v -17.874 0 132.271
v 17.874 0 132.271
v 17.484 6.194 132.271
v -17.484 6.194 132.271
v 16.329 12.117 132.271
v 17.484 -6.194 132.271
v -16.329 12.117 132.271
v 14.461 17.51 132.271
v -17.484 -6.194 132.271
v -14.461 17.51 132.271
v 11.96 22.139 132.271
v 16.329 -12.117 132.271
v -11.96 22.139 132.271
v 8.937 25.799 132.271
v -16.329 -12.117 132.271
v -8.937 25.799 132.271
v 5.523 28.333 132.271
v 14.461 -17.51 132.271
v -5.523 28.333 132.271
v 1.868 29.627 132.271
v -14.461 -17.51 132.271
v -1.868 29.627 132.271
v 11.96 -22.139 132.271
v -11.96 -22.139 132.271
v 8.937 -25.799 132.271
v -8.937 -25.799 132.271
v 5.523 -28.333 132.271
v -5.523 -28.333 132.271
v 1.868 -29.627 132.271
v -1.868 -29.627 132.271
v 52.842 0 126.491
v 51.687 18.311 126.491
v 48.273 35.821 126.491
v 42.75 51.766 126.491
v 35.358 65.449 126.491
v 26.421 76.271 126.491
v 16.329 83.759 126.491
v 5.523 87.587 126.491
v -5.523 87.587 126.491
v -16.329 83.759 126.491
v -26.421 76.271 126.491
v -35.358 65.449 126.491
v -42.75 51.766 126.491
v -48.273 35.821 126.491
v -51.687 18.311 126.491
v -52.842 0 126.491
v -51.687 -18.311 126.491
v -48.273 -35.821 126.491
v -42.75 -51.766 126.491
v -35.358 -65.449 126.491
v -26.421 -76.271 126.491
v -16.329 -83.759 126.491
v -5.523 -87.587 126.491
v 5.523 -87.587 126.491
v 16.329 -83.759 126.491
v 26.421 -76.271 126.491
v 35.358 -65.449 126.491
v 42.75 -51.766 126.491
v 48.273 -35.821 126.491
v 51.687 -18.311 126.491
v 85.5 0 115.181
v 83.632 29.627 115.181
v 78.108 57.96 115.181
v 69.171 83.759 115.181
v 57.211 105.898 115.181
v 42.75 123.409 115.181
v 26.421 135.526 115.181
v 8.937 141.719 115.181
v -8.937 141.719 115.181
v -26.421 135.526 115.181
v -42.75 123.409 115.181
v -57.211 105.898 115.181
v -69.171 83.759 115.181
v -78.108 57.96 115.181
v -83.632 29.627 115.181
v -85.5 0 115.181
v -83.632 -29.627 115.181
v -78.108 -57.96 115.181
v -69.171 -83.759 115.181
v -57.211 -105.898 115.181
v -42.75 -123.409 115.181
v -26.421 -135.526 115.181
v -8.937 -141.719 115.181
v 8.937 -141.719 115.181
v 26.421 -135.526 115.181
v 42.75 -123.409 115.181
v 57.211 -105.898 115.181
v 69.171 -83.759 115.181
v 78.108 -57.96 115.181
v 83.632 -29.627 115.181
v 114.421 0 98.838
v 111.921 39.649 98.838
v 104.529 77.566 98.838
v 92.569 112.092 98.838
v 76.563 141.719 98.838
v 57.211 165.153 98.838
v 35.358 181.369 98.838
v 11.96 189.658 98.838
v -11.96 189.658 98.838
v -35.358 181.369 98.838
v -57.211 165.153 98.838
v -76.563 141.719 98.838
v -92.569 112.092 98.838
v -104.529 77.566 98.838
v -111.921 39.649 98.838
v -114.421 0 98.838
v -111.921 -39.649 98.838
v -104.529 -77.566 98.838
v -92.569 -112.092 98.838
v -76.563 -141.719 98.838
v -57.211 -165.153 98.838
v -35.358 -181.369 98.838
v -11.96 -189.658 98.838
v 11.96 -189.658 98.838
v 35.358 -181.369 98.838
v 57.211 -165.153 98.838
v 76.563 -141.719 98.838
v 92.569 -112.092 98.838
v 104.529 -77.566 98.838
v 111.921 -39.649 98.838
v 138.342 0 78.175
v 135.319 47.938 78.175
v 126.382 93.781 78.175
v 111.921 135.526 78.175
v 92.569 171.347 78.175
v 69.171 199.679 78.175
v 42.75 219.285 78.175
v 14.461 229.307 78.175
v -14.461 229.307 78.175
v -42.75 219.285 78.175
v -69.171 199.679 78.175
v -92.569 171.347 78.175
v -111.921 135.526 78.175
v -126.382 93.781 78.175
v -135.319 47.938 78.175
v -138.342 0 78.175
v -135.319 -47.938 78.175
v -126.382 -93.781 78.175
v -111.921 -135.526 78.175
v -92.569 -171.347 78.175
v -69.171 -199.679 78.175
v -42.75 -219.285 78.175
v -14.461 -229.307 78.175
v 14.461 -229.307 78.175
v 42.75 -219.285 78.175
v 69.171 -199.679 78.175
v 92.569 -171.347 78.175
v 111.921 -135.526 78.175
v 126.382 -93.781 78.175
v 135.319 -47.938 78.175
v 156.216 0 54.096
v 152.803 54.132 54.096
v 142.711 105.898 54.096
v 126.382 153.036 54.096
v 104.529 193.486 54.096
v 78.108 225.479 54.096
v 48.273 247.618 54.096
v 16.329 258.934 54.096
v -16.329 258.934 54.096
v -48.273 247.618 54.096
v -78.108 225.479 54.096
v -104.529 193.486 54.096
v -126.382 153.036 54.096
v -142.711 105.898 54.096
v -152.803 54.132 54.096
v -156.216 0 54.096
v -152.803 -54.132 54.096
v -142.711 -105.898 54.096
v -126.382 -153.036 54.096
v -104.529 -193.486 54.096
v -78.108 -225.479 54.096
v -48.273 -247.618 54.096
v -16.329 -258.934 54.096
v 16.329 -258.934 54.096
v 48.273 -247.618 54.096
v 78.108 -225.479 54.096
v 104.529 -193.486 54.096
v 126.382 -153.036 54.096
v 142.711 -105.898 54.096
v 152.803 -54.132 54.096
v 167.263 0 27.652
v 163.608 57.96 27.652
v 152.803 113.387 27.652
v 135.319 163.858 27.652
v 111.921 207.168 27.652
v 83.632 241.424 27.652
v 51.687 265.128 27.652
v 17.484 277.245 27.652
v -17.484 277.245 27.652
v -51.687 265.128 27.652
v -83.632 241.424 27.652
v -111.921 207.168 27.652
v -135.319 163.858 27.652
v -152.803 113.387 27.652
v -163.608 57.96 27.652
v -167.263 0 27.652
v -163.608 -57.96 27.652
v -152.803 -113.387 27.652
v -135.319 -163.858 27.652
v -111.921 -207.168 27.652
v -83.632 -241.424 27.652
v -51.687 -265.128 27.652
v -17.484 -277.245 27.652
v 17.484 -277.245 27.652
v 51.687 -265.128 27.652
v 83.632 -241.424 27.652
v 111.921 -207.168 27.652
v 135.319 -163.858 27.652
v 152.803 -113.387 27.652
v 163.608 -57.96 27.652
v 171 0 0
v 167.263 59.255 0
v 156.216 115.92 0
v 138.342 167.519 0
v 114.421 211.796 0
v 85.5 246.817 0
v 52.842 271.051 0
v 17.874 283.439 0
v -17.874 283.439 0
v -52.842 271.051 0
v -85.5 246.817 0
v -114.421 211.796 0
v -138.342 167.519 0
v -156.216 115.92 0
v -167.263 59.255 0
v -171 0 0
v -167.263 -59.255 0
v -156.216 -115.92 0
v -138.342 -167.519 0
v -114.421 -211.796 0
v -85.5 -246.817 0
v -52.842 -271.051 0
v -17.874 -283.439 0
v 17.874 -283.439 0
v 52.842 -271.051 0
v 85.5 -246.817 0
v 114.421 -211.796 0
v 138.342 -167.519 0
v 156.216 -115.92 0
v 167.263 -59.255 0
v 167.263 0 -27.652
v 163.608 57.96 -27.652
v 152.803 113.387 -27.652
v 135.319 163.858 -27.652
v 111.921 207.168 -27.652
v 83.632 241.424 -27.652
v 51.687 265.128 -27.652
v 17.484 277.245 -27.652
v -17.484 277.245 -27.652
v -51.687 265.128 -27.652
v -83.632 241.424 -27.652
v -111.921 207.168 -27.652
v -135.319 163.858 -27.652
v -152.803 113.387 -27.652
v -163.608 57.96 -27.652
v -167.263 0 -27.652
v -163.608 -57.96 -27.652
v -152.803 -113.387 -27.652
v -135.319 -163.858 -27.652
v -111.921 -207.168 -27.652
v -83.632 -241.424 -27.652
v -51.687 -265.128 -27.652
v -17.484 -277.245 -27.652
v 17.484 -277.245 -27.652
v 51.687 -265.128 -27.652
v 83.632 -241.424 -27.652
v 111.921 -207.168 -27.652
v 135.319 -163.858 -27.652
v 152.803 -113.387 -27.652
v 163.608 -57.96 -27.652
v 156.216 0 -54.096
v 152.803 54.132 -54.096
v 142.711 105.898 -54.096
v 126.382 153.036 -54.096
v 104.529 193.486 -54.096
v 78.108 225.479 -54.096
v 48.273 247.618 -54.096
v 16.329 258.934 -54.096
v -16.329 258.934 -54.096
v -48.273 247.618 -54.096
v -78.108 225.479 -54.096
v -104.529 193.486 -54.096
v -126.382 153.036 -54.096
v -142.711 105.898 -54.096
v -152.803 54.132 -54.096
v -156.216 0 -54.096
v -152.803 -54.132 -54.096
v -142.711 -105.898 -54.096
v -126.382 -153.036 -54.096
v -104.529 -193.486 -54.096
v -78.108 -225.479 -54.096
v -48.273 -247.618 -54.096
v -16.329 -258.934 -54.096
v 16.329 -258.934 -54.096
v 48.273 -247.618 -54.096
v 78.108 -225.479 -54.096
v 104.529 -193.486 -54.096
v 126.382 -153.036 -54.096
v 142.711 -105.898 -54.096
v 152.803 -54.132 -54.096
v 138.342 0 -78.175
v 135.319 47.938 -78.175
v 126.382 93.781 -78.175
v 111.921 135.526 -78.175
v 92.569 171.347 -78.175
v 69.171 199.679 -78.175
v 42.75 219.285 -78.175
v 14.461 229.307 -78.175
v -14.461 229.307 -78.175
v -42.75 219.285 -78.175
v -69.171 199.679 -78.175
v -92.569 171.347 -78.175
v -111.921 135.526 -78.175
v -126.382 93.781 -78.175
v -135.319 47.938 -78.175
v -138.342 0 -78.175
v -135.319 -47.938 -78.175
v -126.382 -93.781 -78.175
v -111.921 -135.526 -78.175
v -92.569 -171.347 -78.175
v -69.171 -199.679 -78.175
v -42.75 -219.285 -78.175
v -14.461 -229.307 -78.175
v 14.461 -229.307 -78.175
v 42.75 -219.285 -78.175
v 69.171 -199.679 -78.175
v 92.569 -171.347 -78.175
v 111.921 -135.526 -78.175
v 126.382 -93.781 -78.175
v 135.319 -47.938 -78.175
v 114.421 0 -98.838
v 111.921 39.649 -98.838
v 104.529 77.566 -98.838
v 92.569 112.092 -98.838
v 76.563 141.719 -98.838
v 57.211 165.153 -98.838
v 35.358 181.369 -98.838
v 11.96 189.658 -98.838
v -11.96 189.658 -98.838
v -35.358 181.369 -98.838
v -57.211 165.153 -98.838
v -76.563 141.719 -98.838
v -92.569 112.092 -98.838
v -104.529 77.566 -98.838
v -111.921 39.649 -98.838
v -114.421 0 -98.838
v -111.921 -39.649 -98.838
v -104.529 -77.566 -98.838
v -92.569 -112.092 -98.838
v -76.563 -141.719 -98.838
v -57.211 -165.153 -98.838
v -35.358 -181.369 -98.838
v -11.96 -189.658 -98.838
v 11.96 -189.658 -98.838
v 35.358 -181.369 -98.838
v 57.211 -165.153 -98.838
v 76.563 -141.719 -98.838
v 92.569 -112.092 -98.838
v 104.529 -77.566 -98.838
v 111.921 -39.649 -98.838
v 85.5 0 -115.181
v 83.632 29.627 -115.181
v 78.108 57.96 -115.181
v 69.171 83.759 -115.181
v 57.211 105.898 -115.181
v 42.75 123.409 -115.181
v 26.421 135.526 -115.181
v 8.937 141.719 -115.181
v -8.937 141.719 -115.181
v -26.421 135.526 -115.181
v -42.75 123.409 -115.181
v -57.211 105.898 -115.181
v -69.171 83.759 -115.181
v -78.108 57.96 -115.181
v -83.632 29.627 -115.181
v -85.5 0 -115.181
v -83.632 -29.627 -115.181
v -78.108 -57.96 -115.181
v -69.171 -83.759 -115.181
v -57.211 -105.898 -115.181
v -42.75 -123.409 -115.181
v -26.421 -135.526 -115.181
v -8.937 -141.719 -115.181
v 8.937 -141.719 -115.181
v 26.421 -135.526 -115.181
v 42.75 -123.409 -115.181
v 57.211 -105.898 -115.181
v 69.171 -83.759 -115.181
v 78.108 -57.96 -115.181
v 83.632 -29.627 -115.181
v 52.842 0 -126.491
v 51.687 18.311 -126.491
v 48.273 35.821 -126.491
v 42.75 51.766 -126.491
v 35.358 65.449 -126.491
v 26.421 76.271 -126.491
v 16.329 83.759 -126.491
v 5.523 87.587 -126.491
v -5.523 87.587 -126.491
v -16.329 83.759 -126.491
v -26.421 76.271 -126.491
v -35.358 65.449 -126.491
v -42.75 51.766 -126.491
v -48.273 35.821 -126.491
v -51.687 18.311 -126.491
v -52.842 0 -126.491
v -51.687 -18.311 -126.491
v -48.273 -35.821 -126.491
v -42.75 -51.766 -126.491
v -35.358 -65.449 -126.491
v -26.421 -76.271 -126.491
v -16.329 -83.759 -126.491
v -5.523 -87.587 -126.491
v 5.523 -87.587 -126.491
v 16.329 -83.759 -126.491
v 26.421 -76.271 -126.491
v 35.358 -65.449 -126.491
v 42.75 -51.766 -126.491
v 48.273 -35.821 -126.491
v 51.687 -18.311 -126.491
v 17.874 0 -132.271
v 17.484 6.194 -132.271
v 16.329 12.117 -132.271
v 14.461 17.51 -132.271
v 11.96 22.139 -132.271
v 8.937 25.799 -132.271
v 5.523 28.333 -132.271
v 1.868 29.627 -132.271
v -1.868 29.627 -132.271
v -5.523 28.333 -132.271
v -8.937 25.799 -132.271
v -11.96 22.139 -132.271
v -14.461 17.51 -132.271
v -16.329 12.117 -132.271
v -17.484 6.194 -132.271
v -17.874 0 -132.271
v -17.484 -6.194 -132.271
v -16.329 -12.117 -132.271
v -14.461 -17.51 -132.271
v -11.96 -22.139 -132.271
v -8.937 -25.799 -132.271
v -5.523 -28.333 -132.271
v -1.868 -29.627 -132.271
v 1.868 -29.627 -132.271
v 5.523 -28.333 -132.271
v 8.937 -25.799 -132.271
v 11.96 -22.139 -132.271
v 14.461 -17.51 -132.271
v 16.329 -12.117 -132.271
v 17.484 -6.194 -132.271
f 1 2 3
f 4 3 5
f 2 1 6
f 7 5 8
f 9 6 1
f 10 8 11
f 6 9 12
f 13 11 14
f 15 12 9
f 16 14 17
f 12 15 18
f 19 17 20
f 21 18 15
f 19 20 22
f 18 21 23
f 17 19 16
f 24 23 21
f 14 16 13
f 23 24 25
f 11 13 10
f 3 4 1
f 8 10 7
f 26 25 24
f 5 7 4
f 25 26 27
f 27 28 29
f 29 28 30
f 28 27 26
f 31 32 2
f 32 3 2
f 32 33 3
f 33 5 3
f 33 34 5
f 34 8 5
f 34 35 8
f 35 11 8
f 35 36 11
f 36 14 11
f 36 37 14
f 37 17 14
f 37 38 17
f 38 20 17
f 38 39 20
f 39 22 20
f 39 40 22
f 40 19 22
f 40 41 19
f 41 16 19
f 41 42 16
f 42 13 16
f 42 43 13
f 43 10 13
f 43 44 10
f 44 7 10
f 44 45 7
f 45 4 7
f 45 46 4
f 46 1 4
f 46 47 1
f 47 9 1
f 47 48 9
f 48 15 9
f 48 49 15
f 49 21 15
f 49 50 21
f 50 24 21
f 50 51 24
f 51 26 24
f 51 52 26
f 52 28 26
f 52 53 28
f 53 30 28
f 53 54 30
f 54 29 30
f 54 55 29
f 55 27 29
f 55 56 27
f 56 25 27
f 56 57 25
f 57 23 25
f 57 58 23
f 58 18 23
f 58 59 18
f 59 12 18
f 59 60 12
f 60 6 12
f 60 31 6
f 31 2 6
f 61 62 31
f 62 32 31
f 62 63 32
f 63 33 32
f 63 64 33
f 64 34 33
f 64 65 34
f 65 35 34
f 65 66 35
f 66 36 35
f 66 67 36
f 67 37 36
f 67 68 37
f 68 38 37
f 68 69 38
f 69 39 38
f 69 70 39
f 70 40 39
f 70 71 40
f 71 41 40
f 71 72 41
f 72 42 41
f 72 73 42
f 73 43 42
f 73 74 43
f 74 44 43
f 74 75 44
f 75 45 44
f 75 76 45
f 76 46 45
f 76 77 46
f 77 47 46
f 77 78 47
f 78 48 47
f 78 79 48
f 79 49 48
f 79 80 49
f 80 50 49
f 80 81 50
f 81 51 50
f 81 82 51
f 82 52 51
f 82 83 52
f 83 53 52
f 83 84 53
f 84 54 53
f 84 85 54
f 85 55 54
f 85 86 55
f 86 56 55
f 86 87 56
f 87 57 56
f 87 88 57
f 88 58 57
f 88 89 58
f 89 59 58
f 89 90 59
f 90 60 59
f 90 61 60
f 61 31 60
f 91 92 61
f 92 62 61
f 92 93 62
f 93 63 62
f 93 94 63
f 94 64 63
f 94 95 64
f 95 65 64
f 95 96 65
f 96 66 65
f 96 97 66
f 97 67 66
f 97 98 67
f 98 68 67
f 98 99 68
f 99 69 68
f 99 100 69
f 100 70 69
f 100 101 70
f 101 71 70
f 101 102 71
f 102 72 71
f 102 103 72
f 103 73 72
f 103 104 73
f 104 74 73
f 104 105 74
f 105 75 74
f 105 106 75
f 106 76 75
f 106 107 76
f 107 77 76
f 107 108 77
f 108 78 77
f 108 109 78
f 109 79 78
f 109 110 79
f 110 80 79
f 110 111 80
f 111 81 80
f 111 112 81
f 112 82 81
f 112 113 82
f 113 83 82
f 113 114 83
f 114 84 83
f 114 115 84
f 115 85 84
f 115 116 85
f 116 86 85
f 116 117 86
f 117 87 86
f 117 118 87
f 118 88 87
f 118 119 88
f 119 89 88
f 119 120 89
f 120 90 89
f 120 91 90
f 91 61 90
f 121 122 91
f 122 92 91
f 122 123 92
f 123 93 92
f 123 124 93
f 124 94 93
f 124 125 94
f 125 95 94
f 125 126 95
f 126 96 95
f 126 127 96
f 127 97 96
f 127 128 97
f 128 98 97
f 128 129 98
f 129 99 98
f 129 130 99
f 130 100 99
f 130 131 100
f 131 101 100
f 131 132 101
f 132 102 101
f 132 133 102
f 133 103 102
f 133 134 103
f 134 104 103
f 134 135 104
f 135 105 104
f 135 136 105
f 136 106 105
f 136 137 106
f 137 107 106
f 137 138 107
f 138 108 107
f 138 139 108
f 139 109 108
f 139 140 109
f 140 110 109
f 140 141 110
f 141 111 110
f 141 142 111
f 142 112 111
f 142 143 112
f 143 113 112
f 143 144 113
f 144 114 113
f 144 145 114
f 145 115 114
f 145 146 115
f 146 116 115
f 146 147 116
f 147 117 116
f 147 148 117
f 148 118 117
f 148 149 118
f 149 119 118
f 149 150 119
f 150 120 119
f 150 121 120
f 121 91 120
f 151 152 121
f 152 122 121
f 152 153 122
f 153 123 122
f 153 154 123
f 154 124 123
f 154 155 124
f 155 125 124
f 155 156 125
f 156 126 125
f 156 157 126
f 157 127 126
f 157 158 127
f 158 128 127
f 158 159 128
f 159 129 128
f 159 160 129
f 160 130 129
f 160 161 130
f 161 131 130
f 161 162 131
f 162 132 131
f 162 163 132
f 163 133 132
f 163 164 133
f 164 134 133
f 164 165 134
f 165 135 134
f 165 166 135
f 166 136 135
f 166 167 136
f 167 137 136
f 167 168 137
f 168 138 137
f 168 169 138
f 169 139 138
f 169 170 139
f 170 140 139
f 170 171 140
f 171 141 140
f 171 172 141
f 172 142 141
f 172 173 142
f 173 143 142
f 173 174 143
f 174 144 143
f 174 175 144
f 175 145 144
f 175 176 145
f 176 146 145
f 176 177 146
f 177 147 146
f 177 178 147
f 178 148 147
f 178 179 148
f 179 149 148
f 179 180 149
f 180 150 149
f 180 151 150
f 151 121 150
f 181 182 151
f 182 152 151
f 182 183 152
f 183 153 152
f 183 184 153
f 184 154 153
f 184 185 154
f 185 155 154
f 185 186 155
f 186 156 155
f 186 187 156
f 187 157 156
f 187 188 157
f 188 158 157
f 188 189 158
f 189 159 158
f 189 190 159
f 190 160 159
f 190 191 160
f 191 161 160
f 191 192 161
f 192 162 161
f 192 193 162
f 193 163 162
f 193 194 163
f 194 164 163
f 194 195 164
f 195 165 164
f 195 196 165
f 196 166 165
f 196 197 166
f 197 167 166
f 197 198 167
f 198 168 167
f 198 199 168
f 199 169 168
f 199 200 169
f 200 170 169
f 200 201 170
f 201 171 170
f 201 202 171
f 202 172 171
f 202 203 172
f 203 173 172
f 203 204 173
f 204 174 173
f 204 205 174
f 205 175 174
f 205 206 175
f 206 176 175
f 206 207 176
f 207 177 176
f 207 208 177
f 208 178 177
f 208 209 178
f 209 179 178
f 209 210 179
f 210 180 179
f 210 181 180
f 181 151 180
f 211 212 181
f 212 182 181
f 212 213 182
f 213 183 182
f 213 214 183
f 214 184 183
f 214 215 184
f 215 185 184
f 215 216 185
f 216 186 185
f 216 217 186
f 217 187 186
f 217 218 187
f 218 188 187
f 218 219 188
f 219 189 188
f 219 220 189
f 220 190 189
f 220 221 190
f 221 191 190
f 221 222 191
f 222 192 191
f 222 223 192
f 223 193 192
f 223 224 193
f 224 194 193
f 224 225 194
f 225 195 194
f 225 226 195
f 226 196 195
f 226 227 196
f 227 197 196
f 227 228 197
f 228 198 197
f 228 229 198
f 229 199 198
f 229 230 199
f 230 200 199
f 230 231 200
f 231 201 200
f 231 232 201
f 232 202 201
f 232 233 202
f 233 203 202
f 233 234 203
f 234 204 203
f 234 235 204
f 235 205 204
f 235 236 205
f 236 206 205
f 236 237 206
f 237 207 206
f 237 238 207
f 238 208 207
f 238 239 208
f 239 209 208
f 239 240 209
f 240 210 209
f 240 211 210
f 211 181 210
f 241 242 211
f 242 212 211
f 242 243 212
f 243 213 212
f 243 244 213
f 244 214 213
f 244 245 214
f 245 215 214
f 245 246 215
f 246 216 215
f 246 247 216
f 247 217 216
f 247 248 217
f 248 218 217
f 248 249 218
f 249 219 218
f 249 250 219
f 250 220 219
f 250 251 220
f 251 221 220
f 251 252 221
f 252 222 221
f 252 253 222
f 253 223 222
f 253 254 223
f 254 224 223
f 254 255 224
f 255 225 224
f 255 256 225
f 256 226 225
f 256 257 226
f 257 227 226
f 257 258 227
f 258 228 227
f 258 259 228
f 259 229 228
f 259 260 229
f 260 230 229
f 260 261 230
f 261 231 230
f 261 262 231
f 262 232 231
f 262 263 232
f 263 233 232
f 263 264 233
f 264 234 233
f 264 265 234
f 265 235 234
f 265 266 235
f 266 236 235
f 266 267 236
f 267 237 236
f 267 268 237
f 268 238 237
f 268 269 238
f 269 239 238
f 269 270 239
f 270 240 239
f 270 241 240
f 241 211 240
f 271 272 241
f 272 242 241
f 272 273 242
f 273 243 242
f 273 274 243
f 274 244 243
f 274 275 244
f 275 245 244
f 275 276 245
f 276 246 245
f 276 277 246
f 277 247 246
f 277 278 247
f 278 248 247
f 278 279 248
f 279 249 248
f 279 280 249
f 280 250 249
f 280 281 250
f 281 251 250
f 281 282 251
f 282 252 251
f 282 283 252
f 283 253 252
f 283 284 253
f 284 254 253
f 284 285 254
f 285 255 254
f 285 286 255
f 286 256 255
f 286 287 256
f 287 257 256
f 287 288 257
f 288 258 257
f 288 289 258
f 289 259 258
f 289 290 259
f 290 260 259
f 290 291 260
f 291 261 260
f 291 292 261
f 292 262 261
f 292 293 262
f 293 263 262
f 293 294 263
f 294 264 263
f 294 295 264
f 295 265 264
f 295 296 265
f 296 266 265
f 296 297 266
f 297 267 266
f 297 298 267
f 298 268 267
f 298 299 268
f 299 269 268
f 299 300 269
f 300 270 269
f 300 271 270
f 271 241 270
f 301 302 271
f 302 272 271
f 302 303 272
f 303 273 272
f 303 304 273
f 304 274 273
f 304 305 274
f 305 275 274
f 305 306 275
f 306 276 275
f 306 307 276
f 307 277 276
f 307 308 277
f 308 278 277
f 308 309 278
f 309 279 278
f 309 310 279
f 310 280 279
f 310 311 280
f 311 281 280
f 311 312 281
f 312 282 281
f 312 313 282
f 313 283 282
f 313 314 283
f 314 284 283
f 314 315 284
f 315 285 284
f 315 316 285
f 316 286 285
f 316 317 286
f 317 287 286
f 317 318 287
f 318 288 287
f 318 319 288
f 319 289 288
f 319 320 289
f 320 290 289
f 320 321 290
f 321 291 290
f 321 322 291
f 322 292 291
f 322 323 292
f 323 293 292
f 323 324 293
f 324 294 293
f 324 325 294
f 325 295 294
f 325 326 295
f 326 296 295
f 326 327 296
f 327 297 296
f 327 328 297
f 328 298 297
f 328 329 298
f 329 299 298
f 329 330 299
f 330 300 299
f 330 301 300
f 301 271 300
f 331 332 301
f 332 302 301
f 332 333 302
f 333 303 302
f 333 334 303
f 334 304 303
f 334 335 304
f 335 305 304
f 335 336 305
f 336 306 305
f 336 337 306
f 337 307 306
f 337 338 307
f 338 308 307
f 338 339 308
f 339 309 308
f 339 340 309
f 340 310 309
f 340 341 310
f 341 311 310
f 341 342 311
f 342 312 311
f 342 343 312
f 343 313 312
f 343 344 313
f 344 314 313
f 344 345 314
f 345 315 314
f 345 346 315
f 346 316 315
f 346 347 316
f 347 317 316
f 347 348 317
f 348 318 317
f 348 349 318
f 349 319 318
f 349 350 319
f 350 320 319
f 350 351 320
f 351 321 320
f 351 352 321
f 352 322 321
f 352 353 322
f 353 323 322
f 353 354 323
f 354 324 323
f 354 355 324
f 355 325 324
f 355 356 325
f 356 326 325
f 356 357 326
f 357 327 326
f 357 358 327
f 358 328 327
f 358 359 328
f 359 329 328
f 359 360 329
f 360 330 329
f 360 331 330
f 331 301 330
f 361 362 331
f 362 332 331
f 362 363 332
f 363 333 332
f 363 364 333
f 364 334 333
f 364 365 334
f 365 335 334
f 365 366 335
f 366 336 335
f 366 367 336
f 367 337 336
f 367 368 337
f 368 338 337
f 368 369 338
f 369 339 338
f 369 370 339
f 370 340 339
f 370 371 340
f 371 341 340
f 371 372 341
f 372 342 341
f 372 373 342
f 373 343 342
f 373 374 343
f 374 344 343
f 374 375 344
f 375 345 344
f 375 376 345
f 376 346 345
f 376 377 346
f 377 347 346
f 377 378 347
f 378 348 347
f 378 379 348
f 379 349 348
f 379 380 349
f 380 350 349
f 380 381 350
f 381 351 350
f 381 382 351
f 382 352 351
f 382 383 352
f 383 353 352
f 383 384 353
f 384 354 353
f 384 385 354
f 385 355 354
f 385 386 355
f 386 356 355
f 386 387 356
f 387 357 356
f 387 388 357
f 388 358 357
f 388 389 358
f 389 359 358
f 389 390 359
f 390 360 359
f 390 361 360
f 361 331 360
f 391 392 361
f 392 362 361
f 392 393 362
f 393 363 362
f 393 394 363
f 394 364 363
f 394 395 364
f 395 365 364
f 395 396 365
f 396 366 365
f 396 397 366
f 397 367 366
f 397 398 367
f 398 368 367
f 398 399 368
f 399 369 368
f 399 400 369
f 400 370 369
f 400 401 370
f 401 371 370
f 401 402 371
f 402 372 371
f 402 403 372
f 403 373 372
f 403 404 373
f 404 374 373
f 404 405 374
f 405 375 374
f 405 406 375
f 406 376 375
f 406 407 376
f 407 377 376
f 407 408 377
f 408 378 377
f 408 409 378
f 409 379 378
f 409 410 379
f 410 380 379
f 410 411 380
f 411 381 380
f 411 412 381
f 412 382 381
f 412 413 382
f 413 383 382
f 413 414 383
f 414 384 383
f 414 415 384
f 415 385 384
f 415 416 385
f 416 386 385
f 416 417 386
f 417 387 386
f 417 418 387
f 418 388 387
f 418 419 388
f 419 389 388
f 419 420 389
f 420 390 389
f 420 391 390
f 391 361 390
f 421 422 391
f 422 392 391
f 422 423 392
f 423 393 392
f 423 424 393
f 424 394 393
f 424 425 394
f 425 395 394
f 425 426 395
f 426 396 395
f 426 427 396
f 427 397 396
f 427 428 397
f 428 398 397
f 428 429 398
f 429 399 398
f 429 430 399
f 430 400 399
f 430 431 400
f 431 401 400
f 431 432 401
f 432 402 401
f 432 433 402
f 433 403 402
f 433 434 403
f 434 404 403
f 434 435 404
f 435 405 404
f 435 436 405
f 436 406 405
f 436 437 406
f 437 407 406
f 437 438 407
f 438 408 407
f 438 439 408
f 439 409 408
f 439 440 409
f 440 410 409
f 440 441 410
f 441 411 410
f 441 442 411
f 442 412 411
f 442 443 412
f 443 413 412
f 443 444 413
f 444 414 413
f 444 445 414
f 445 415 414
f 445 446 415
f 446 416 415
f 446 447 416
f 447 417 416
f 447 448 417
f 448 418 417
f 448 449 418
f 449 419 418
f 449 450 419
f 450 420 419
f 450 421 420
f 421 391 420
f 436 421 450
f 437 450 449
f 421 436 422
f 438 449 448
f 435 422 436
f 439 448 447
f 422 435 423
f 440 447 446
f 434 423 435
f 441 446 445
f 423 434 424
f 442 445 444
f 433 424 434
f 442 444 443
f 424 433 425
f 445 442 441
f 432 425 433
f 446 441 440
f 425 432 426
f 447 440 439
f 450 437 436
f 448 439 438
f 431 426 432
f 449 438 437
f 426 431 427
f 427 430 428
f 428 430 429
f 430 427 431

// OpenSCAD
// Generated by SolidPython 1.0.1 on 2020-07-29 00:46:49


scale(v = [9, 15, 7]) {
	sphere(r = 19);
}
/***********************************************
*********      SolidPython code:      **********
************************************************
 
# import packages: SolidPython
from solid import *
from solid.utils import *
from itertools import chain, combinations, permutations


class Resize:

    def __init__(self, scad_file):
        self.scad_file = scad_file
        #self.scad_file = import_scad(scad_file)
        # cone/cylinder param:
        self.r1 = 0
        self.r2 = 0
        self.h = 0
        # rectangular prism param:
        self.w = 0
        self.l = 0
        # ellipse param:
        self.r = 0

    # import OpenScad code (file name corresponds to shape)


    # classify shape + parameters
    def assign(self, param1, param2, param3):
        if self.scad_file == 'cone.scad':
            self.r1 = param1
            self.r2 = param2
            self.h = param3
        elif self.scad_file == 'cylinder.scad':
            self.r1 = param1
            self.r2 = param2
            self.h = param3
        elif self.scad_file == 'rectangularPrism.scad':
            self.h = param1
            self.l = param2
            self.w = param3
        else:
            self.r = param1
            self.h = param2

    # resize parameters
    def iterate(self):
        x = range(3, 20, 2)
        i = 1
        if self.scad_file == 'cone.scad':
            tempList = list(permutations(x, 2))
            for temp in tempList:
                param1 = temp[0]
                param2 = temp[1]
                filepath = 'produced_scad_files/' + 'cone' + str(param1) + '_' + str(param2) + '_' + '.scad'
                scad_render_to_file(cylinder(h=param1, r1=param2, r2=0), filepath)

        elif self.scad_file == 'cylinder.scad':
            tempList = list(permutations(x, 3))
            for temp in tempList:
                param1 = temp[0]
                param2 = temp[1]
                filepath = 'produced_scad_files/' + 'cylinder' + str(param1) + '_' + str(param2) + '_' + '.scad'
                scad_render_to_file(cylinder(h=param1, r1=param2, r2=param2), filepath)

        elif self.scad_file == 'rectangularPrism.scad':
            tempList = list(permutations(x, 3))
            for temp in tempList:
                param1 = temp[0]
                param2 = temp[1]
                param3 = temp[2]
                filepath = 'produced_scad_files/' + 'rectangularPrism' + str(param1) + '_' + str(param2) + '_' + str(
                    param3) + '.scad'
                scad_render_to_file(cube(size=(param1, param2, param3)), filepath)

        elif self.scad_file == 'ellipse.scad':
            tempList = list(permutations(x, 4))
            for temp in tempList:
                param1 = temp[0]
                param2 = temp[1]
                param3 = temp[2]
                param4 = temp[3]
                filepath = 'produced_scad_files/' + 'ellipse' + str(param1) + '_' + str(param2) + '_' + str(param3) + '_' + str(param4) + '.scad'
                scad_render_to_file(scale([param1, param2, param3])(sphere(r=param4)), filepath)

    def render_to_scadfile(self):
        scad_render_to_file(scad, 'example.scad') 
 
************************************************/
